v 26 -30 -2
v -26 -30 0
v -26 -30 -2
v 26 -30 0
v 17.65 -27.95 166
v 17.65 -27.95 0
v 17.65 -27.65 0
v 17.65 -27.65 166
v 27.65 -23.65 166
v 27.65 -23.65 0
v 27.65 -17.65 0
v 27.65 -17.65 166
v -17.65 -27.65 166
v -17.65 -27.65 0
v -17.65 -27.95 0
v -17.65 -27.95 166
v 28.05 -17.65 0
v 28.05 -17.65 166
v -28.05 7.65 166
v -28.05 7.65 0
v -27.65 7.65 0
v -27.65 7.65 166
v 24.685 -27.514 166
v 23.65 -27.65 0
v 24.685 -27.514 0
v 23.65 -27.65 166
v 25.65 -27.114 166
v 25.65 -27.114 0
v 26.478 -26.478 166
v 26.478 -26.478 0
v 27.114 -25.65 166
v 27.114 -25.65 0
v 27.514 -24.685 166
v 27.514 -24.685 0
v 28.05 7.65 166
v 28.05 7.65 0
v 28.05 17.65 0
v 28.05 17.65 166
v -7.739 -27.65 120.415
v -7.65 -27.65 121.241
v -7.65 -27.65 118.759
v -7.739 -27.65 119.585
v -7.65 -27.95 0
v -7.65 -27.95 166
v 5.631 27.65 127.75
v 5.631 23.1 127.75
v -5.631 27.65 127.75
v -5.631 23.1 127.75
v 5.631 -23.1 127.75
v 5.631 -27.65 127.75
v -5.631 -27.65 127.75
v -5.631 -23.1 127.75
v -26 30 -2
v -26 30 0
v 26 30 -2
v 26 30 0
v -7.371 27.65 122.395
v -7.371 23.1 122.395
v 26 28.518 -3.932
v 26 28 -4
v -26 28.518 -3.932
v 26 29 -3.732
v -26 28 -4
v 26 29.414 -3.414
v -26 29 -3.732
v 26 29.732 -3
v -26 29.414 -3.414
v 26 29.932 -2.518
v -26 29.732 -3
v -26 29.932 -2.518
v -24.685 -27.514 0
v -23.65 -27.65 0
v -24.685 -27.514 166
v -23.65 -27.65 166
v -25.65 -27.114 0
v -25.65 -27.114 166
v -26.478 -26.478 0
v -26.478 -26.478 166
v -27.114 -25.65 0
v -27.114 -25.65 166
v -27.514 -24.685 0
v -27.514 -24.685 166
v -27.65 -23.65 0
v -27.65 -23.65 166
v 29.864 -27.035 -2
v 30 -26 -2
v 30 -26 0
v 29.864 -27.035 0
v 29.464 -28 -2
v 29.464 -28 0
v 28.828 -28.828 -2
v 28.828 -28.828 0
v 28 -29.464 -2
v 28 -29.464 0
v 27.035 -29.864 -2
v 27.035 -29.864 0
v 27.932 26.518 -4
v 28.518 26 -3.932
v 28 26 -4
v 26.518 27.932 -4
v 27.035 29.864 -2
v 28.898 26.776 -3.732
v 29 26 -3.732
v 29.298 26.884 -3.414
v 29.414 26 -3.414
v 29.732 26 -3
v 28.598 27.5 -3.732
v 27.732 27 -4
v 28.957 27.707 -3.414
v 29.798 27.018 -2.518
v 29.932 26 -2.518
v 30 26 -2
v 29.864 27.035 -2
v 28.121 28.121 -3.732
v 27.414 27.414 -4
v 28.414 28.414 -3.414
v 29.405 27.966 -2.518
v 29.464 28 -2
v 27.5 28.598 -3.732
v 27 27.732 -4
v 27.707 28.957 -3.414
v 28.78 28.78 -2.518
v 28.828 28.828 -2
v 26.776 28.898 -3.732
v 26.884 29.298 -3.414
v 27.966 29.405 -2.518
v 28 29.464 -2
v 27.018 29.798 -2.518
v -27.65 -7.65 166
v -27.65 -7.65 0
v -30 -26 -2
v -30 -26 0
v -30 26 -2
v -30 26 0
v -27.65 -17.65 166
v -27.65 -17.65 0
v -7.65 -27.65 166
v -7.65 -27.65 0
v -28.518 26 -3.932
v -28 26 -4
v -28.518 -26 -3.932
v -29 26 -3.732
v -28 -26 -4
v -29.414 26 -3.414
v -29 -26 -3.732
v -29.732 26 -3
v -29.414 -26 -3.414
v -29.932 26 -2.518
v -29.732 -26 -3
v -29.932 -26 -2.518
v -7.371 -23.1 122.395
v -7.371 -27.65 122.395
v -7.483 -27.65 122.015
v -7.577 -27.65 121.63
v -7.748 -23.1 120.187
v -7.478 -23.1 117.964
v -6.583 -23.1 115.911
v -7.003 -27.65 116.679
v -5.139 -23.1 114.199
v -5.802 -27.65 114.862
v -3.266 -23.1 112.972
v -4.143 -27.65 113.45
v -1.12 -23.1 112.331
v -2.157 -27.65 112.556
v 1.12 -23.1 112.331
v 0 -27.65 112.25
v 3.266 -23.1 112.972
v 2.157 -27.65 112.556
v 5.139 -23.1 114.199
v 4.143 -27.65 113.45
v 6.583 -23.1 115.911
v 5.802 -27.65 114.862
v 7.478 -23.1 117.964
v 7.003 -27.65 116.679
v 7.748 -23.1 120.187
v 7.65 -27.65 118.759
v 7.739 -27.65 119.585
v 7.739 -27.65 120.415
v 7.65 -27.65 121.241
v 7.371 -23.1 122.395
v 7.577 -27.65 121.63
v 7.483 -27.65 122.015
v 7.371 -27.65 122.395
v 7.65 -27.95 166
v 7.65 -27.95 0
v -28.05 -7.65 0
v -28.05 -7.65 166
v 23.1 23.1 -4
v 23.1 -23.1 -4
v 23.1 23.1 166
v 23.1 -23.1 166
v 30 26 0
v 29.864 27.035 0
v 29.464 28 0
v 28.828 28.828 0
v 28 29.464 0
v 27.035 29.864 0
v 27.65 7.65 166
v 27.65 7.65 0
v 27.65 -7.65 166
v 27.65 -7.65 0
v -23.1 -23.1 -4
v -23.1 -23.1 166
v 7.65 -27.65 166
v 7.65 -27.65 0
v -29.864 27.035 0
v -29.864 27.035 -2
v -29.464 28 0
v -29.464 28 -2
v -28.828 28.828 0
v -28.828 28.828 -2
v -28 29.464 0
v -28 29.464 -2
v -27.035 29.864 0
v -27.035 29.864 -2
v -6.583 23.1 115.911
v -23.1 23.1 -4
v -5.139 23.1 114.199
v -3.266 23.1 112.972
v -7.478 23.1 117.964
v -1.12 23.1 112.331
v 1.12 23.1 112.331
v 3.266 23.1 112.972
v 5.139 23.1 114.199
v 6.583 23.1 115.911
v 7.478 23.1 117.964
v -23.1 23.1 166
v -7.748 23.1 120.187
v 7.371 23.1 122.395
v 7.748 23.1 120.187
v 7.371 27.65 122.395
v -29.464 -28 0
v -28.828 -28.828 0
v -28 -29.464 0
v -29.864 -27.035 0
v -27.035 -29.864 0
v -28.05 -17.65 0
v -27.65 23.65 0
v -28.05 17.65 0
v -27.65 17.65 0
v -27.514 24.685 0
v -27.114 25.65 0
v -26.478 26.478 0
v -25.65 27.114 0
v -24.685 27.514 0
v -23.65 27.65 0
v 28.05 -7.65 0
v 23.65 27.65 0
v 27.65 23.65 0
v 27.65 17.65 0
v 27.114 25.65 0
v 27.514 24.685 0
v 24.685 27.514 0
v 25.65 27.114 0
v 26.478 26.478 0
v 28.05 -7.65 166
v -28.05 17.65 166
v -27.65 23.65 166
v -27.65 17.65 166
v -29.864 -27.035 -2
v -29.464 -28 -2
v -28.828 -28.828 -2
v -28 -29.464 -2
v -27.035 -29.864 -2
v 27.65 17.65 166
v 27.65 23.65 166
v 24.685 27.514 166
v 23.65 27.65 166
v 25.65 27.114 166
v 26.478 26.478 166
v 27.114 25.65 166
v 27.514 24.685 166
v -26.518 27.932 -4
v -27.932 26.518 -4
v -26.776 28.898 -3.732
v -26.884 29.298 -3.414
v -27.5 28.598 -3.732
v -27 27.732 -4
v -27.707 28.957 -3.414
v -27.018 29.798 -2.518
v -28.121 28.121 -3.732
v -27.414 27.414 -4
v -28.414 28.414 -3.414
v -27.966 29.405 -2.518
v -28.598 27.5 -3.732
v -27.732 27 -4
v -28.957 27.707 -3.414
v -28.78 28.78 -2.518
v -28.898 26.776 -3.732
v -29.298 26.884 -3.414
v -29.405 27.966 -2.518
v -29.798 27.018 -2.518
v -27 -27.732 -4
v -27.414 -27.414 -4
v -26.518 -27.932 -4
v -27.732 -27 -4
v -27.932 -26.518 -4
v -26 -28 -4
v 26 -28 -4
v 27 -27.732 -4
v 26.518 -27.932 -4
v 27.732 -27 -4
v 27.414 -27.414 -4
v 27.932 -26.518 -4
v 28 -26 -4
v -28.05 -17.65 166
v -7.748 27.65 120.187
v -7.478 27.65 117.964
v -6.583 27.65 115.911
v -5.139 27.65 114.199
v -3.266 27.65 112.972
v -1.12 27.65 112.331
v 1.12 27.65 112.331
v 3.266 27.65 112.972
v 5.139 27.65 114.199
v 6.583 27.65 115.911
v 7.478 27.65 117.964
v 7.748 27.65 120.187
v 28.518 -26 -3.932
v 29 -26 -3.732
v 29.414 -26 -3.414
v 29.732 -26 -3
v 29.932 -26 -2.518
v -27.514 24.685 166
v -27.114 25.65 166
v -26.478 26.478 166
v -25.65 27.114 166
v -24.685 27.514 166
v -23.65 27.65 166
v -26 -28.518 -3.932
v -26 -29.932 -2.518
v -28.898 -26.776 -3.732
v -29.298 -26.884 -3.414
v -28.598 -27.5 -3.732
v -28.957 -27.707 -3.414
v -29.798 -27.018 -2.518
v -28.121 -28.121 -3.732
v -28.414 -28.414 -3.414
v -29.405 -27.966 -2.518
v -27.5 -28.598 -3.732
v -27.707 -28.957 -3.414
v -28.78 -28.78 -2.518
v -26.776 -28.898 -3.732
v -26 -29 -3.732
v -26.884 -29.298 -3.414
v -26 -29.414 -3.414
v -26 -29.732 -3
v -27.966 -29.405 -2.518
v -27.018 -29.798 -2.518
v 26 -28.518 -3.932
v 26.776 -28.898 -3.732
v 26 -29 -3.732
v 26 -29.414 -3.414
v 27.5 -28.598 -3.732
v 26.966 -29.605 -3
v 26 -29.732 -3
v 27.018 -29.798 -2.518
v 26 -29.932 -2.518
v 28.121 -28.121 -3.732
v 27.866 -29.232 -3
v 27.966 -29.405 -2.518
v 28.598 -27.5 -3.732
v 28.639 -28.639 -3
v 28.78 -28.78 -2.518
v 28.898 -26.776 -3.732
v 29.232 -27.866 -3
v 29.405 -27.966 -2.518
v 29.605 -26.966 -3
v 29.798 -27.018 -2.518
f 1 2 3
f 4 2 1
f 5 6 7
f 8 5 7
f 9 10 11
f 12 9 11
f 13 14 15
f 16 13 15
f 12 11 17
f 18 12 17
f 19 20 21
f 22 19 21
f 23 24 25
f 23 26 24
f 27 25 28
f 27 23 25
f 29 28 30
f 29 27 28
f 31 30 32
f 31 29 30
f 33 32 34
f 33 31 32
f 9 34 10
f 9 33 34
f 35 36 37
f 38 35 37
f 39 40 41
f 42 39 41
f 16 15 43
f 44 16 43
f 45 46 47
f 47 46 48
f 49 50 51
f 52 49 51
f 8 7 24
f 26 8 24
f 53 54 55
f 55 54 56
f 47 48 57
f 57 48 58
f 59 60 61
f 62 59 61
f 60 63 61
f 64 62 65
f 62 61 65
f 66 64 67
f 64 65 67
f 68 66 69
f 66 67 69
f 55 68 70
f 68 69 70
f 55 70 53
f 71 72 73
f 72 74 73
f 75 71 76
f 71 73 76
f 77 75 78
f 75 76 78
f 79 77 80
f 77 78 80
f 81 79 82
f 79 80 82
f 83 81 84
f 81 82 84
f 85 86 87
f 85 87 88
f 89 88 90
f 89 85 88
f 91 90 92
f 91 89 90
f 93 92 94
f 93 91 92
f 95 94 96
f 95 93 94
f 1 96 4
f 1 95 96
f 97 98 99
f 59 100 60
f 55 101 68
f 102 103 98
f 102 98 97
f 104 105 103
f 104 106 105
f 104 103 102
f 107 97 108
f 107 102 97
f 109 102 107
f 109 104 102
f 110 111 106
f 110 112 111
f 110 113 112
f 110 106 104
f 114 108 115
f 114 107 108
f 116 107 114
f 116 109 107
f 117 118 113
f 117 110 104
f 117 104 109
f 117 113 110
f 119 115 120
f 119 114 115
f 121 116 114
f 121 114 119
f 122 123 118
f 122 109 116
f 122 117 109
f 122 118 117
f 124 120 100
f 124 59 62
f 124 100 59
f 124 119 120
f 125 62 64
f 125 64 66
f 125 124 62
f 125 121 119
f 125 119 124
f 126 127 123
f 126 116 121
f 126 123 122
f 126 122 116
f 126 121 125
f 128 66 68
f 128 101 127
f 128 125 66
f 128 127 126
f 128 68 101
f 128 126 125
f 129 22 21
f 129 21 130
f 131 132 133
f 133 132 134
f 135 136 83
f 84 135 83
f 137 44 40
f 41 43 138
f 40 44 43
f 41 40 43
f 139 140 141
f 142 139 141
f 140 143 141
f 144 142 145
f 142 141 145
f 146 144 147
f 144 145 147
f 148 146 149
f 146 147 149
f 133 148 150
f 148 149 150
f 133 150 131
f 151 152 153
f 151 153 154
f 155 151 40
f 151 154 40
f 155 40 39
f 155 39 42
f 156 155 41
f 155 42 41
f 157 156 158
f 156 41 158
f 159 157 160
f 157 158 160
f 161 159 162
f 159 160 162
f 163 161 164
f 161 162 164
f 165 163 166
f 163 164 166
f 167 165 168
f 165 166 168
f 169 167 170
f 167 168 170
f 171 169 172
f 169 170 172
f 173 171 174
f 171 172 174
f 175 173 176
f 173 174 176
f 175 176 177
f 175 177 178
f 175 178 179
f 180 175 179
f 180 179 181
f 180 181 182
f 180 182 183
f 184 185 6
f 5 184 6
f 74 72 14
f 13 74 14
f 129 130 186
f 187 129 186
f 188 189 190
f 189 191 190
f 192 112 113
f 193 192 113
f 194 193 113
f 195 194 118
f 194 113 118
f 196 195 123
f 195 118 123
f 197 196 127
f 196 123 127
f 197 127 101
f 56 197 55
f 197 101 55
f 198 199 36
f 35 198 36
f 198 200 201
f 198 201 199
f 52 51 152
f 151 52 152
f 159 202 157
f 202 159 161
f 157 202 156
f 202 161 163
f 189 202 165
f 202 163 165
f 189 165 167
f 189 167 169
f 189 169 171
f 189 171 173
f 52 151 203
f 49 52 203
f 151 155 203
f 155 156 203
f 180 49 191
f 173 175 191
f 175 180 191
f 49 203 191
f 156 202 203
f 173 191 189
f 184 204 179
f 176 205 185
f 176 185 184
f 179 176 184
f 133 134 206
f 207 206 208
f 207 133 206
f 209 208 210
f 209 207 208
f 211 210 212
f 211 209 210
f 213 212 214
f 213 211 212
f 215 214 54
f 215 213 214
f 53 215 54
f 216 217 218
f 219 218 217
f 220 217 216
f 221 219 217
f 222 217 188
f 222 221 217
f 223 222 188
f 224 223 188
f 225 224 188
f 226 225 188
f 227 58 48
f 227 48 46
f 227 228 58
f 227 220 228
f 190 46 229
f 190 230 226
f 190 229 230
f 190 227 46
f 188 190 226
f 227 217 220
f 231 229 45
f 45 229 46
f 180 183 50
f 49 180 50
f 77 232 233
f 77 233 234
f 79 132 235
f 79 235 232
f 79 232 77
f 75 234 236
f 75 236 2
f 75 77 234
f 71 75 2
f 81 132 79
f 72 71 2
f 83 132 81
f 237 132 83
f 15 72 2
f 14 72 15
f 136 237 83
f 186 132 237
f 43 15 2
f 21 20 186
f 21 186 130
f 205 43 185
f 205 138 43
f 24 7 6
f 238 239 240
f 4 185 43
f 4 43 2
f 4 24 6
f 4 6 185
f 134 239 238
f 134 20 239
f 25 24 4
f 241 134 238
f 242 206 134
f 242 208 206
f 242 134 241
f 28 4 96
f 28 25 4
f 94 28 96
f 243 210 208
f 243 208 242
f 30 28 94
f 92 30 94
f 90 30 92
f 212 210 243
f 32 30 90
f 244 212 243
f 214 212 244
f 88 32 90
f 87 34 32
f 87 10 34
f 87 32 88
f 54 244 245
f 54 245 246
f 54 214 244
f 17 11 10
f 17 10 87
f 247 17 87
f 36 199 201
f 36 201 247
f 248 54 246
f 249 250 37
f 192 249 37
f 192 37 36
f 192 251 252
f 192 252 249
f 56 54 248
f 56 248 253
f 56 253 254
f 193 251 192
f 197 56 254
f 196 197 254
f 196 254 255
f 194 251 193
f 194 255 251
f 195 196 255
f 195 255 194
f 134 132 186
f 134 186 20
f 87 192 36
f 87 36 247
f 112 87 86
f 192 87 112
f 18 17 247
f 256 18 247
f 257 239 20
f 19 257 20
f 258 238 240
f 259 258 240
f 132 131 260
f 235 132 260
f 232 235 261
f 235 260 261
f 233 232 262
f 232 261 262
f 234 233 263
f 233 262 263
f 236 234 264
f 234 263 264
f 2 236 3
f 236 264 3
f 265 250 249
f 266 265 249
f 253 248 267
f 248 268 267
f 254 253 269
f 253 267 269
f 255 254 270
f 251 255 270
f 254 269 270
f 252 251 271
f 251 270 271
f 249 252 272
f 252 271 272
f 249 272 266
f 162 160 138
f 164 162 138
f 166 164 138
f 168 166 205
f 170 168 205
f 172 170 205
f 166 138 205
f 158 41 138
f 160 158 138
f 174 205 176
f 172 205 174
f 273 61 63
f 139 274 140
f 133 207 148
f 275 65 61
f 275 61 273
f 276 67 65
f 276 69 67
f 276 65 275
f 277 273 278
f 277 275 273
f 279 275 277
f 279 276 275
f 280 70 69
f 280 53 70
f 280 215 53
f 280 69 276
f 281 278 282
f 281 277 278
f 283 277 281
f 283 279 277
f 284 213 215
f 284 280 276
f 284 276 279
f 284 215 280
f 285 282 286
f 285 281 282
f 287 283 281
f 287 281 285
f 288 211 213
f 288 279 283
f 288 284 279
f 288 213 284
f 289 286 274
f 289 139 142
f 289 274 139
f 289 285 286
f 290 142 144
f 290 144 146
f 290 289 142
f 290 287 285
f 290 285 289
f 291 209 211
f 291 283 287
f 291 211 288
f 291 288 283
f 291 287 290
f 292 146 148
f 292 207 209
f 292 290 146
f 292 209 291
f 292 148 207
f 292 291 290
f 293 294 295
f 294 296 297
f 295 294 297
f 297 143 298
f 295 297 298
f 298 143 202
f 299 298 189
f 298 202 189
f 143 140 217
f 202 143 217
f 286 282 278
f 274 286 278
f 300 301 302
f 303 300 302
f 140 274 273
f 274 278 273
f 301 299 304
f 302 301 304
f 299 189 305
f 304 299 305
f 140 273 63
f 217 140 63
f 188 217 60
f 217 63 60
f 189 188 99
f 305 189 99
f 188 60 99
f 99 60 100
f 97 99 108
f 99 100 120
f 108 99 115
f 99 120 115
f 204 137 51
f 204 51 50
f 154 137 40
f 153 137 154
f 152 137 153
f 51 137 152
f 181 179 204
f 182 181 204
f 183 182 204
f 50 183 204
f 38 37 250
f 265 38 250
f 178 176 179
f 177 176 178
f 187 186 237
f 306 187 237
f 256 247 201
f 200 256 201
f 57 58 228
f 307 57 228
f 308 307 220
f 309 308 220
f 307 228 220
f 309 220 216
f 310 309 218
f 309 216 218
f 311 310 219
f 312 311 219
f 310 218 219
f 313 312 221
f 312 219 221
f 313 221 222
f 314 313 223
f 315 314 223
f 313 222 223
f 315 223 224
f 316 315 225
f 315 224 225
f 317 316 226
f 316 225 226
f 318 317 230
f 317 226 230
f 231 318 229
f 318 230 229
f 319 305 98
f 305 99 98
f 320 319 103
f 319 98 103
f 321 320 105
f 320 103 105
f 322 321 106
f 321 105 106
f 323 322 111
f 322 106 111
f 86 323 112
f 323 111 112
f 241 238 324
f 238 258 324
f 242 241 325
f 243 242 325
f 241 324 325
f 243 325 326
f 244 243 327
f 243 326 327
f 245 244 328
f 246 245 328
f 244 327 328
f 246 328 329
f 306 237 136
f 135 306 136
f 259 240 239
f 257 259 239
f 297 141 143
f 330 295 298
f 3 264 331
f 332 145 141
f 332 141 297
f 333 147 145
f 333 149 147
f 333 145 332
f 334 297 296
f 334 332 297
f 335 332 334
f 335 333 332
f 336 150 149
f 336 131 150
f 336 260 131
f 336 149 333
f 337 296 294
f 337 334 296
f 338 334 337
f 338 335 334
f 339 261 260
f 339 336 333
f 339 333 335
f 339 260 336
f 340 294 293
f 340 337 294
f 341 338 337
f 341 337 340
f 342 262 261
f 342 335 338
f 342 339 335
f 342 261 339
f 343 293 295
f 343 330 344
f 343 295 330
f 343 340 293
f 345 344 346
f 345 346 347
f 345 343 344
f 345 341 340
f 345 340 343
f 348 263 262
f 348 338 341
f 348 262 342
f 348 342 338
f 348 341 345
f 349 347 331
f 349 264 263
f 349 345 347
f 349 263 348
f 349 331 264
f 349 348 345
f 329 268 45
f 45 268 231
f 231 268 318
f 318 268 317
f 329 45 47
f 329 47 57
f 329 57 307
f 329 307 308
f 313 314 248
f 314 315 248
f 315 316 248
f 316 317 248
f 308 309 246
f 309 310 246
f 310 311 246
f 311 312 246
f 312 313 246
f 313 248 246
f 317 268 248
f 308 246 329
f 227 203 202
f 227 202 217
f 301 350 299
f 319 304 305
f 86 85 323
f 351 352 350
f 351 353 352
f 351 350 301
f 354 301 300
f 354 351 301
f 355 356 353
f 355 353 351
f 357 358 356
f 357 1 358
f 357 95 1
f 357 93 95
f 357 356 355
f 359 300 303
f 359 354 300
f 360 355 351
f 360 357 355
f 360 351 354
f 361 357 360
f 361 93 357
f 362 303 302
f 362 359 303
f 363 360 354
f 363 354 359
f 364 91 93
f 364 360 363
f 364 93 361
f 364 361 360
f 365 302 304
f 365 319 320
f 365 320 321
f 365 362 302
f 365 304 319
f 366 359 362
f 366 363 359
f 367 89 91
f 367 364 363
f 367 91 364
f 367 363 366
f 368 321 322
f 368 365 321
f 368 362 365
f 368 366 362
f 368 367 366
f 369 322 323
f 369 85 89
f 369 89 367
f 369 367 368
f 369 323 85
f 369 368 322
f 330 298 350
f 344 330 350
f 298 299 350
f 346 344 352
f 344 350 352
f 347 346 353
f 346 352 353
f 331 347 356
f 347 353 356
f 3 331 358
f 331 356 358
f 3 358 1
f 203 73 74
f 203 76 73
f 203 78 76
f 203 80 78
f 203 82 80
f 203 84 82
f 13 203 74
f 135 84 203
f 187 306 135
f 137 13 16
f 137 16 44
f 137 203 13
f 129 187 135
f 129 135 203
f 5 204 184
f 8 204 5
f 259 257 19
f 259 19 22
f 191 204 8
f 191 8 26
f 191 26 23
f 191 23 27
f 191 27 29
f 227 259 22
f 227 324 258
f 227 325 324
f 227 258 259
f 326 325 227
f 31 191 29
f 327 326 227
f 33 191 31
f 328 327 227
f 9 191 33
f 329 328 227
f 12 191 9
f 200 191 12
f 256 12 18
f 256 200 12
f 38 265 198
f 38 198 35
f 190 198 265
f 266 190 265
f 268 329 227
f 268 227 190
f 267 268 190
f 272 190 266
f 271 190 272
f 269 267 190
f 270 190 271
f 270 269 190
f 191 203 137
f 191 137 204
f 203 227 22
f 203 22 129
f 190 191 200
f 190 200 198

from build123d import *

# Parameters (mm, degrees)
F0_W     = 46.2
F0_H     = 46.2
F1_DEPTH = 166
F0_W_2   = 60
F0_H_2   = 60
F2_DEPTH = 4
F3_R     = 4
F4_R     = 2
F7_DEPTH = 80


with BuildPart() as f1:
    # F0 (on Top) → F1 (new body)
    with BuildSketch(Plane.XY):
        Polygon((27.65, 17.65), (27.65, 27.65), (-27.65, 27.65), (-27.65, 17.65), (-28.05, 17.65), (-28.05, 7.65), (-27.65, 7.65), (-27.65, -7.65), (-28.05, -7.65), (-28.05, -17.65), (-27.65, -17.65), (-27.65, -27.65), (-17.65, -27.65), (-17.65, -27.95), (-7.65, -27.95), (-7.65, -27.65), (7.65, -27.65), (7.65, -27.95), (17.65, -27.95), (17.65, -27.65), (27.65, -27.65), (27.65, -17.65), (28.05, -17.65), (28.05, -7.65), (27.65, -7.65), (27.65, 7.65), (28.05, 7.65), (28.05, 17.65), align=None)
        Rectangle(F0_W, F0_H, mode=Mode.SUBTRACT)
    extrude(amount=F1_DEPTH)

    # F0 (on Top) → F2 (join)
    with BuildSketch(Plane.XY):
        Rectangle(F0_W_2, F0_H_2)
        Polygon((-27.65, 27.65), (27.65, 27.65), (27.65, 17.65), (28.05, 17.65), (28.05, 7.65), (27.65, 7.65), (27.65, -7.65), (28.05, -7.65), (28.05, -17.65), (27.65, -17.65), (27.65, -27.65), (17.65, -27.65), (17.65, -27.95), (7.65, -27.95), (7.65, -27.65), (-7.65, -27.65), (-7.65, -27.95), (-17.65, -27.95), (-17.65, -27.65), (-27.65, -27.65), (-27.65, -17.65), (-28.05, -17.65), (-28.05, -7.65), (-27.65, -7.65), (-27.65, 7.65), (-28.05, 7.65), (-28.05, 17.65), (-27.65, 17.65), align=None, mode=Mode.SUBTRACT)
        Polygon((27.65, 17.65), (27.65, 27.65), (-27.65, 27.65), (-27.65, 17.65), (-28.05, 17.65), (-28.05, 7.65), (-27.65, 7.65), (-27.65, -7.65), (-28.05, -7.65), (-28.05, -17.65), (-27.65, -17.65), (-27.65, -27.65), (-17.65, -27.65), (-17.65, -27.95), (-7.65, -27.95), (-7.65, -27.65), (7.65, -27.65), (7.65, -27.95), (17.65, -27.95), (17.65, -27.65), (27.65, -27.65), (27.65, -17.65), (28.05, -17.65), (28.05, -7.65), (27.65, -7.65), (27.65, 7.65), (28.05, 7.65), (28.05, 17.65), align=None)
        Rectangle(F0_W, F0_H, mode=Mode.SUBTRACT)
    extrude(amount=-F2_DEPTH)

    # F3
    f3_edges = [f1.edges().sort_by_distance(p)[0] for p in [
        (-27.65, 27.65, 83),
        (-27.65, -27.65, 83),
        (27.65, -27.65, 83),
        (27.65, 27.65, 83),
        (30, 30, -2),
        (30, -30, -2),
        (-30, 30, -2),
        (-30, -30, -2),
    ]]
    fillet(f3_edges, radius=F3_R)

    # F4
    f4_edges = [f1.edges().sort_by_distance(p)[0] for p in [
        (30, 0, -4),
    ]]
    fillet(f4_edges, radius=F4_R)

    # F6 (on offset) → F7 (cut)
    with BuildSketch(Plane.XZ.offset(27.65)):
        with BuildLine():
            Line((-5.630705, 127.75), (-7.370688, 122.394882))
            ThreePointArc((-7.370688, 122.394882), (0, 112.25), (7.370688, 122.394882))
            Line((7.370688, 122.394882), (5.630705, 127.75))
            Line((5.630705, 127.75), (-5.630705, 127.75))
        make_face()
    extrude(amount=-F7_DEPTH, mode=Mode.SUBTRACT)


solid = f1.part
